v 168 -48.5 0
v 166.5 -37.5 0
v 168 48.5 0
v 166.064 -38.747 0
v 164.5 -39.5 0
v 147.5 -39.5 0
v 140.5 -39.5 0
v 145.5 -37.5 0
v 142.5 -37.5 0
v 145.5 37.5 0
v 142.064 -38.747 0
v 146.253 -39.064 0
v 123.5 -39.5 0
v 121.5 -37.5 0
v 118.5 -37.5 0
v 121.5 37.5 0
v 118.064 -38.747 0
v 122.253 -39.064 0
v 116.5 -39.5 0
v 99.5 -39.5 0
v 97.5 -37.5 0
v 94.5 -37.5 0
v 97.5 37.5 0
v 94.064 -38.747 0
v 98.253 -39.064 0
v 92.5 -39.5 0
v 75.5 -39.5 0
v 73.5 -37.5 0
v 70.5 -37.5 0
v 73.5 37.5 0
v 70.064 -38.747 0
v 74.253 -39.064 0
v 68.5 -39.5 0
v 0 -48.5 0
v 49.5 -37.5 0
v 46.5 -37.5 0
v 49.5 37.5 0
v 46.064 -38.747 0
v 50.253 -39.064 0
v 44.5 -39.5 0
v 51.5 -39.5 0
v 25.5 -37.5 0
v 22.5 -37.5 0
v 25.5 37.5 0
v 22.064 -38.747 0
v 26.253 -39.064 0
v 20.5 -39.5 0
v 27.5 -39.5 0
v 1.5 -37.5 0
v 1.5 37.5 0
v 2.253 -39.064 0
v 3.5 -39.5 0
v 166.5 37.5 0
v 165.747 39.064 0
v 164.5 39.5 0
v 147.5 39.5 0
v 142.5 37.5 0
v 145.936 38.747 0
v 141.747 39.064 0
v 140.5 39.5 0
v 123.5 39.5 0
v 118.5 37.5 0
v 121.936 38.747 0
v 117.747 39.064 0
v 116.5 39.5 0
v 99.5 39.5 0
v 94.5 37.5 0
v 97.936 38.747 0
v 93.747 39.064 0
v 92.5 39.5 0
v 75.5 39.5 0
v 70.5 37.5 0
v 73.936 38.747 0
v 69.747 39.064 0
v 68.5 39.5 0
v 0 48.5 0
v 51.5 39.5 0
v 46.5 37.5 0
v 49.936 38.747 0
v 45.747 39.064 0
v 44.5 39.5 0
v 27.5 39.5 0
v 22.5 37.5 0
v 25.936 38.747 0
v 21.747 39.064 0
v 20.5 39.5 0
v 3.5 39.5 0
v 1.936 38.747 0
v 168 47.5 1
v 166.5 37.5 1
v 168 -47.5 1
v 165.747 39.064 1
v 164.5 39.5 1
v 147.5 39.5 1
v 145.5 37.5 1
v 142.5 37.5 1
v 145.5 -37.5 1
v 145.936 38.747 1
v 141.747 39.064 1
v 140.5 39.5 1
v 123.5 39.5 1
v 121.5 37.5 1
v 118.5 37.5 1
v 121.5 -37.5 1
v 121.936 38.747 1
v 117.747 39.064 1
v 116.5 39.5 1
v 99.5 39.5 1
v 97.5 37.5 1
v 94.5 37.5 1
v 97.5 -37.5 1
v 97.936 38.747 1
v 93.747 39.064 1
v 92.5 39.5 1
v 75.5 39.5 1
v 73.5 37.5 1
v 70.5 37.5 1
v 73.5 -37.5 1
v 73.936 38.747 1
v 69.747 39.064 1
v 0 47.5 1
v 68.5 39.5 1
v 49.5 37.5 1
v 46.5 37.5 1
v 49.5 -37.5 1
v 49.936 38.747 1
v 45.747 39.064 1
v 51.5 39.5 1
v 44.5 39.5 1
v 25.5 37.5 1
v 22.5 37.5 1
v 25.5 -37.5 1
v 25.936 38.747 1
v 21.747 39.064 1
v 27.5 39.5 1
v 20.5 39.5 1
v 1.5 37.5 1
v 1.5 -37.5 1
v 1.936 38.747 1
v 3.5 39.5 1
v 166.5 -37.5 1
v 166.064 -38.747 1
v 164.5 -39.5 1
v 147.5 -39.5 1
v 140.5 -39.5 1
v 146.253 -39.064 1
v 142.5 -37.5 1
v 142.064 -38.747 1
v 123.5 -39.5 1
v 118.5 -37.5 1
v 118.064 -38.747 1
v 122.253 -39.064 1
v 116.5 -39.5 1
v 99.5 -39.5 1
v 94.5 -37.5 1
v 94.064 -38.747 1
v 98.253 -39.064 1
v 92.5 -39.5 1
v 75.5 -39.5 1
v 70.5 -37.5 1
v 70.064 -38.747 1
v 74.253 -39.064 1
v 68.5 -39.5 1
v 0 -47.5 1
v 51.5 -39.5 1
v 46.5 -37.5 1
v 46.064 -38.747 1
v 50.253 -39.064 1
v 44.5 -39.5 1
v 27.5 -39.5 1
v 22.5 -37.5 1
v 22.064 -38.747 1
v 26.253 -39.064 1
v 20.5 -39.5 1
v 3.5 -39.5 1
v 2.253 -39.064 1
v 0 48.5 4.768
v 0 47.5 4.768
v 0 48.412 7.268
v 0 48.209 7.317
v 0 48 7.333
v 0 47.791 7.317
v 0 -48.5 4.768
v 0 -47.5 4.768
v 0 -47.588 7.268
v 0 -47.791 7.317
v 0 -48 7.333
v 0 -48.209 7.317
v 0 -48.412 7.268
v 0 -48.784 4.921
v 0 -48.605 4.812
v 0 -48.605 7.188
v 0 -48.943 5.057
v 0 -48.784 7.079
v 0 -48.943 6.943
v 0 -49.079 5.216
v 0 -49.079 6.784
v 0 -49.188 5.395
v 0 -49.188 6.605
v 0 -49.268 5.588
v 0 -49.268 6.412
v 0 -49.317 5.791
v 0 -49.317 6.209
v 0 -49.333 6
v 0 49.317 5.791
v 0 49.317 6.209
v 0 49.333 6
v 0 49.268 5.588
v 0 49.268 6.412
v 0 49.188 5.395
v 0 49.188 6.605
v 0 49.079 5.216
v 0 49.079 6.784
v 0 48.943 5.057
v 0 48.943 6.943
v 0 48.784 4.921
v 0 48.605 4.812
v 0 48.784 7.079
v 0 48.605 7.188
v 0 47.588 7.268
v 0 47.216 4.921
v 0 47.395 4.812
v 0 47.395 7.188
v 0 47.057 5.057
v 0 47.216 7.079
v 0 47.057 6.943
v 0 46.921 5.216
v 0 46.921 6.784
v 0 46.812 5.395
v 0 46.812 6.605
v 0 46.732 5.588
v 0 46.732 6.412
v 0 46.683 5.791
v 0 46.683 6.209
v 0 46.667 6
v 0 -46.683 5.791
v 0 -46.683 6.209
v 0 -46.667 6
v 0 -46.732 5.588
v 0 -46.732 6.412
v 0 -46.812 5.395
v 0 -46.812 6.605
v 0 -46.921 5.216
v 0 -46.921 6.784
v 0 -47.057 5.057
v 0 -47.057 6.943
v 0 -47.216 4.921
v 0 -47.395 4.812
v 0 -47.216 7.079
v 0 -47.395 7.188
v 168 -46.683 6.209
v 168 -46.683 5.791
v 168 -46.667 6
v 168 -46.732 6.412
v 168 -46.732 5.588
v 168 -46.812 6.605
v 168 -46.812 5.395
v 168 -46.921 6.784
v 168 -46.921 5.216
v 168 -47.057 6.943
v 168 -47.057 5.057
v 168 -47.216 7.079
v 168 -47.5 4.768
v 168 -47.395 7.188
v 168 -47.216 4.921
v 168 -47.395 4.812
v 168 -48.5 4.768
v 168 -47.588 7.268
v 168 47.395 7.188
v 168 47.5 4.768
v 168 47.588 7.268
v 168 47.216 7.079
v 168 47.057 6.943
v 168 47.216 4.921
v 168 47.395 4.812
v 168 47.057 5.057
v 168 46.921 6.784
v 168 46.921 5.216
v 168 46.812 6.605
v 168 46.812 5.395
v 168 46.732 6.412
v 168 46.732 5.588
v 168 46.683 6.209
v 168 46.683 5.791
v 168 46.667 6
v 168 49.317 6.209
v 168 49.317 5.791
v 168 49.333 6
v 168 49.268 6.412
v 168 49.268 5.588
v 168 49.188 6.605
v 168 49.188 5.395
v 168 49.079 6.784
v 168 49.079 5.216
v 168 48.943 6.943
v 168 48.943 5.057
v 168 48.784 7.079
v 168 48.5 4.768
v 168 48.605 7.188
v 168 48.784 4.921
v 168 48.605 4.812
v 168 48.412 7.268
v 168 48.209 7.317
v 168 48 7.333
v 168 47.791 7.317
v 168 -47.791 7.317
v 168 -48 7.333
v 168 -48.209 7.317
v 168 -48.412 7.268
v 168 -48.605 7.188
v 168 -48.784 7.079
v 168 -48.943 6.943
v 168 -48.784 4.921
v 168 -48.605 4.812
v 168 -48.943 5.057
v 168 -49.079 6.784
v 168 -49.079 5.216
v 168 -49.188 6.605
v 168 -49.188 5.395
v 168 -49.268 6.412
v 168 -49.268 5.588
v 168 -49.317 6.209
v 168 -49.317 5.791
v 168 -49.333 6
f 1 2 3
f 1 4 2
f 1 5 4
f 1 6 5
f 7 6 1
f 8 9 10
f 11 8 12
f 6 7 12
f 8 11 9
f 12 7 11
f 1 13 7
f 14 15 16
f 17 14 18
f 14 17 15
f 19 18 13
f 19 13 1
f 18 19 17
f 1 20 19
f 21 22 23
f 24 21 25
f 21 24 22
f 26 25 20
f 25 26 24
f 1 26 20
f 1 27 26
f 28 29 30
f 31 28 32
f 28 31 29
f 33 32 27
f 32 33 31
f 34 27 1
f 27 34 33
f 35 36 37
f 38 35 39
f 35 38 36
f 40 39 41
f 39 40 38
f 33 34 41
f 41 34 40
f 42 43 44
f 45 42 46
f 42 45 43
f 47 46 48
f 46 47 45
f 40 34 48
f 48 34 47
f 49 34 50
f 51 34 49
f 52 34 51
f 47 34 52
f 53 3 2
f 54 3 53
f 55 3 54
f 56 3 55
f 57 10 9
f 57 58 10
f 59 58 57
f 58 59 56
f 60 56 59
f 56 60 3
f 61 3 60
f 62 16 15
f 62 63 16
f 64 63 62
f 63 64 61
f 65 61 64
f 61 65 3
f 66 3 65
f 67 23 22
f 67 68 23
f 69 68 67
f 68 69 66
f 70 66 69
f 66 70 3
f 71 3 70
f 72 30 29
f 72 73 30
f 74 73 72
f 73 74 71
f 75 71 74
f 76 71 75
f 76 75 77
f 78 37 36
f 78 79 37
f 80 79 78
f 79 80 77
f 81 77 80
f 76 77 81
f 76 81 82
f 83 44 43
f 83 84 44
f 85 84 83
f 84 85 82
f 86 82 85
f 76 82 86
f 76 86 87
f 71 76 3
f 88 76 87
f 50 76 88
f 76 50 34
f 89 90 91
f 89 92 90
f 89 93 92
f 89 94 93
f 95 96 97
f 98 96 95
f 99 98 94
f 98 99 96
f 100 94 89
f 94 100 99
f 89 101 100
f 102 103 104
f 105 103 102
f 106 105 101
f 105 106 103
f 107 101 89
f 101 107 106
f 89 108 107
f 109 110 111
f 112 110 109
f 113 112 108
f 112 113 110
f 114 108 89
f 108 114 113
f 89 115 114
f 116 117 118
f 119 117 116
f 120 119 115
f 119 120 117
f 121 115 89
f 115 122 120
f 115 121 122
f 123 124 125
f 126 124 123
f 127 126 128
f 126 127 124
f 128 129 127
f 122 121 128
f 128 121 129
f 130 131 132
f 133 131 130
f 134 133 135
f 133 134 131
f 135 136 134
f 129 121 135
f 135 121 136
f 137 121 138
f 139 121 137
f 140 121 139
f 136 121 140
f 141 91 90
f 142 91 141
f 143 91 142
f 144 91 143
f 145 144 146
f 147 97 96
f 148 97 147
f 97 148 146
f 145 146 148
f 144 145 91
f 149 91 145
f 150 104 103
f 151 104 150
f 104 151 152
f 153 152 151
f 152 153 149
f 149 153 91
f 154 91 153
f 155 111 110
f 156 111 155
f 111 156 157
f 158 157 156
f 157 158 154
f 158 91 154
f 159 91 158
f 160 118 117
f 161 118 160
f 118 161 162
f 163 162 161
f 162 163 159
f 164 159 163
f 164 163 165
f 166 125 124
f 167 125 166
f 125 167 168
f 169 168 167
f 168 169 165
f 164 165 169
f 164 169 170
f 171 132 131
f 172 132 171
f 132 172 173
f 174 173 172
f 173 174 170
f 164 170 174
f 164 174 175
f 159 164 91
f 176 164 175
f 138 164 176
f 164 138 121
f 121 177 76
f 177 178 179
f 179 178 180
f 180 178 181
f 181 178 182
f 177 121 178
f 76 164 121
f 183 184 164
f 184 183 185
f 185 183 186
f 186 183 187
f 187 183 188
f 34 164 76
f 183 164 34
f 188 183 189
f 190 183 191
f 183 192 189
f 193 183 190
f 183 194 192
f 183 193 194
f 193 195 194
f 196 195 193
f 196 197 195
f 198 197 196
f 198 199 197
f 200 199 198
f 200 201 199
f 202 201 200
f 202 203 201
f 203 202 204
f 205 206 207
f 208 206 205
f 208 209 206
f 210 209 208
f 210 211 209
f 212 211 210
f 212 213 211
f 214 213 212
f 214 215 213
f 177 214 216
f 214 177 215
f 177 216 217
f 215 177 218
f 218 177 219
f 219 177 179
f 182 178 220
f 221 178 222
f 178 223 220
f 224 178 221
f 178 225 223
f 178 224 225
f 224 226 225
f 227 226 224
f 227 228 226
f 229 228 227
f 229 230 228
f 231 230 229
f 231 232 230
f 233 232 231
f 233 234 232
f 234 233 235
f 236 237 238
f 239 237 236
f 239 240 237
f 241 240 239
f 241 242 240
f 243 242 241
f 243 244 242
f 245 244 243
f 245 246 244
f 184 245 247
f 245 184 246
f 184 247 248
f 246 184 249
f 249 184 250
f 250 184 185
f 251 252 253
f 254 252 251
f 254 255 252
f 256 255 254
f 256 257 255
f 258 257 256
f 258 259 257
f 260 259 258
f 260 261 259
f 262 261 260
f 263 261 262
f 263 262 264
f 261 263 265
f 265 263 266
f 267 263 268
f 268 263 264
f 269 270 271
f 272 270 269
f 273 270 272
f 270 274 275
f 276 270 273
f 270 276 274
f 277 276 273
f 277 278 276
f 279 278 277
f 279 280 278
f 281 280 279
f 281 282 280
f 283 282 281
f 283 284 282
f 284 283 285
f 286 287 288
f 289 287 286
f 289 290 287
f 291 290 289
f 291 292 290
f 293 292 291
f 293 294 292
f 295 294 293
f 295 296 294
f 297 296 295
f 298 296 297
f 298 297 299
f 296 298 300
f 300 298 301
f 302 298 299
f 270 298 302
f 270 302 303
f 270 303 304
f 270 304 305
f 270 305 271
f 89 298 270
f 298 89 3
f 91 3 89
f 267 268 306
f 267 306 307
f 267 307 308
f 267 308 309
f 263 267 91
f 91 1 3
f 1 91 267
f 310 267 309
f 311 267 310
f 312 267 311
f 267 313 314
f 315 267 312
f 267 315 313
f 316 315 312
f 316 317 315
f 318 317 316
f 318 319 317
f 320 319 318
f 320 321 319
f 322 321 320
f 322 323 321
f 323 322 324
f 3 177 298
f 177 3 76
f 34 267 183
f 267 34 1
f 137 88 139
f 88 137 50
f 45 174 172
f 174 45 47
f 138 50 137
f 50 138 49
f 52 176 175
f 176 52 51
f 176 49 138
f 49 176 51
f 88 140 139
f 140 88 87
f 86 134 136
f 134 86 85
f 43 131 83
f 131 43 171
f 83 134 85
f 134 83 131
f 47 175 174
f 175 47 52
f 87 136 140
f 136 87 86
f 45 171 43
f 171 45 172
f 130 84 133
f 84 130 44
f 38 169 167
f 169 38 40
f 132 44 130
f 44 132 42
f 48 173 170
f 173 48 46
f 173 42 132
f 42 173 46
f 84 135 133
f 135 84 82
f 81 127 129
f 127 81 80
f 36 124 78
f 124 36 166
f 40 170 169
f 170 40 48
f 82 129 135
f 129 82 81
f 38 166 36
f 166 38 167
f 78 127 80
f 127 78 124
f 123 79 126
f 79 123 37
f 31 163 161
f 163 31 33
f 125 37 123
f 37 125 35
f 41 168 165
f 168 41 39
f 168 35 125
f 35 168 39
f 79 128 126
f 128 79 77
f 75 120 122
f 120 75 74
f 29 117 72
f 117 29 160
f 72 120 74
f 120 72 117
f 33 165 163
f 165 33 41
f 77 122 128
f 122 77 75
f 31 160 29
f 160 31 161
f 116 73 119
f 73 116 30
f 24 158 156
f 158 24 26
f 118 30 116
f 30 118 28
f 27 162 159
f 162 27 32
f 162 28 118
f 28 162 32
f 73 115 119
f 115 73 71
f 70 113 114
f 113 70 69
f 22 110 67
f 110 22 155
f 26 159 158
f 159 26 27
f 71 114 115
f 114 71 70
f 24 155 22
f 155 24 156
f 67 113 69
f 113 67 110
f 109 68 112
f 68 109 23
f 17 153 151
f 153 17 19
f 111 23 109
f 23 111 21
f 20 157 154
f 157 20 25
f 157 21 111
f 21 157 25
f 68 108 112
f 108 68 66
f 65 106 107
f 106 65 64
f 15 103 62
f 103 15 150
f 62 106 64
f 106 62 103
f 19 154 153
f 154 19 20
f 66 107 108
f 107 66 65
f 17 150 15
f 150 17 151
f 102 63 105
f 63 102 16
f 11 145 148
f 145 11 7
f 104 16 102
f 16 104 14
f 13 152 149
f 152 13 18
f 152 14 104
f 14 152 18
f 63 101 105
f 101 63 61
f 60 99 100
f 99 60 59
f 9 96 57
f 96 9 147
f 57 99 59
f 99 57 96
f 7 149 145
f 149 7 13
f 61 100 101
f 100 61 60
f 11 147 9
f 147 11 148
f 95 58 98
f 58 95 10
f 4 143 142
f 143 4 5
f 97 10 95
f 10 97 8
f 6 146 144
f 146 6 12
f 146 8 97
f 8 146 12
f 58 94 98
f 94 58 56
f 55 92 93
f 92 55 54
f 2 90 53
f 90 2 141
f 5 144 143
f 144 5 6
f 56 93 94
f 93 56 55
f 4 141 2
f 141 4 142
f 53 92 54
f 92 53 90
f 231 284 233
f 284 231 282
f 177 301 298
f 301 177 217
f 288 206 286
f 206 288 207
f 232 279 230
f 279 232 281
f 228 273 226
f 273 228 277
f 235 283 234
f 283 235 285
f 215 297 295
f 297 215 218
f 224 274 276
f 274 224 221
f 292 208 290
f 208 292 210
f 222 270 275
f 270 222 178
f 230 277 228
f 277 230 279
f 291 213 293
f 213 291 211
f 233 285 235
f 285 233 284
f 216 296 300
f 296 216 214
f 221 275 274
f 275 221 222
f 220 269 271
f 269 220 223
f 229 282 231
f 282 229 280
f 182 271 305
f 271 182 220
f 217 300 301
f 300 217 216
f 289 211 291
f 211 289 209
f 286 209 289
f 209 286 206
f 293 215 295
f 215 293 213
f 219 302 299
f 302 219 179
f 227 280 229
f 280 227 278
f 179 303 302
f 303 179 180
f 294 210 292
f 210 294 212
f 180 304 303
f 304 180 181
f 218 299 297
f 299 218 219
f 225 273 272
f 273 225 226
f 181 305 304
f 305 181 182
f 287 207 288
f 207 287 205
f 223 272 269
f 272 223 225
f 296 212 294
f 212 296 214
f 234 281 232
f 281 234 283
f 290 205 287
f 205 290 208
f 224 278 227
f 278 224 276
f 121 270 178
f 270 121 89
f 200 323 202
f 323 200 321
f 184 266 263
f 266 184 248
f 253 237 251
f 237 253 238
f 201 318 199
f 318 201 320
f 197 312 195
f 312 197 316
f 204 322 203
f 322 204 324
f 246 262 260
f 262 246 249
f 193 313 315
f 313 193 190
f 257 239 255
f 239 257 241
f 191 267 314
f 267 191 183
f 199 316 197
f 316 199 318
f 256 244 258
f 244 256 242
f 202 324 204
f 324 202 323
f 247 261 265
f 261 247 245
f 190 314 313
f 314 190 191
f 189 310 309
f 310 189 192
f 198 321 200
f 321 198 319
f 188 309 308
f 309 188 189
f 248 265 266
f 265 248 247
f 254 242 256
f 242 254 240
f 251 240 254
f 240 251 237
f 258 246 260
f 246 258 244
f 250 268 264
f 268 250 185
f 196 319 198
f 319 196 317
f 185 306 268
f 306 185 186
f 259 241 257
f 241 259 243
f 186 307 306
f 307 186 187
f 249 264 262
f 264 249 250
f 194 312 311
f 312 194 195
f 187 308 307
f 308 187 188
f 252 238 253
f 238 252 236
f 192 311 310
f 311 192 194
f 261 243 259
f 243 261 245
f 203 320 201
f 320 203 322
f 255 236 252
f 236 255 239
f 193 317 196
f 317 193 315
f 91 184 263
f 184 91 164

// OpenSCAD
// Silicon Square Ice Tray Holder
// This helps stiffen up a silicon ice tray, so it can be placed into the fridge more easily.
// Author: Brian Khuu (2018)
tol = 2; //mm

/* Tray Holder Spec */
tray_holder_thickness = 1;// Thickness of this object
tray_holder_cell_count = 7; // Number of cells to hold up

/* Silicon Tray Spec */
gap_l = 10; // Gap Above Each Cell (mm)
gap_w = 7;  // Gap Between Cells (mm)
ice_w = 17; // Ice Cell Width (mm)
ice_l = 75; // Ice Cell Length (mm)
ice_h = 20; // Ice Cell Height (mm)
silicon_thickness= 3; // Silicon Thickness (mm)

/* Reference Model Enable/Disable */
enable_reference_model = false;
if(enable_reference_model)
translate([0,0,silicon_thickness])
union()
{
  // Ice Hole
  for(i = [0:1:3])
    %translate([i*(ice_w+gap_w),0,-ice_h/2])  cube([ice_w, ice_l, ice_h], center=true);

  // Gap Check
  for(i = [-1:1:3])
    %translate([i*(ice_w+gap_w) + (ice_w+gap_w)/2,0,silicon_thickness/2]) color([0.5,0.5,1]) cube([gap_w, ice_l,silicon_thickness], center=true);
  
  // Side
  %translate([30,ice_l/2+gap_l/2,silicon_thickness/2]) color([0.5,0.5,1]) cube([100, gap_l, silicon_thickness], center=true);
  %translate([30,-(ice_l/2+gap_l/2),silicon_thickness/2]) color([0.5,0.5,1]) cube([100, gap_l, silicon_thickness], center=true);
}

module ice_holder_shape(i)
{ 
  translate([i*(ice_w+gap_w)+(ice_w+gap_w)/2,0,0])
  linear_extrude(height = tray_holder_thickness)
    offset(delta=gap_w/2)
      square([ice_w, ice_l], center=true);
}

module ice_holder_hole(i)
{ 
  translate([i*(ice_w+gap_w)+(ice_w+gap_w)/2,0,-1])
  linear_extrude(height = tray_holder_thickness+2)
    offset(tol)
      square([ice_w, ice_l], center=true);
}

module ice_holder(count)
{
  union()
  {
    // Holder
    difference()
    {
      union()
      {
        // Body
        for ( i = [0:1:count-1] )
          ice_holder_shape(i);
        
        // Side
        translate([count*(ice_w+gap_w)/2, ice_l/2+gap_l/2, tray_holder_thickness/2]) 
          cube([count*(ice_w+gap_w), gap_l+tray_holder_thickness*2, tray_holder_thickness], center=true);
        translate([count*(ice_w+gap_w)/2, -(ice_l/2+gap_l/2), tray_holder_thickness/2]) 
          cube([count*(ice_w+gap_w), gap_l+tray_holder_thickness*2, tray_holder_thickness], center=true);
      }
      for ( i = [0:1:count] )
        ice_holder_hole(i);
    }
    
    // Handle
    translate([0,(ice_l)/2+gap_l,0])
      union()
      {
        translate([0,tray_holder_thickness/2,2*silicon_thickness], $fn=40)
          rotate([0,90,0])
            cylinder(count*(ice_w+gap_w),r=tray_holder_thickness*4/3);
        cube([count*(ice_w+gap_w),tray_holder_thickness,2*silicon_thickness]);
      }
    translate([0,-((ice_l)/2+gap_l)-tray_holder_thickness,0])
      union()
      {
        translate([0,tray_holder_thickness/2,2*silicon_thickness], $fn=40)
          rotate([0,90,0])
            cylinder(count*(ice_w+gap_w),r=tray_holder_thickness*4/3);
        cube([count*(ice_w+gap_w),tray_holder_thickness,2*silicon_thickness]);
      }
  }
}

ice_holder(tray_holder_cell_count);
